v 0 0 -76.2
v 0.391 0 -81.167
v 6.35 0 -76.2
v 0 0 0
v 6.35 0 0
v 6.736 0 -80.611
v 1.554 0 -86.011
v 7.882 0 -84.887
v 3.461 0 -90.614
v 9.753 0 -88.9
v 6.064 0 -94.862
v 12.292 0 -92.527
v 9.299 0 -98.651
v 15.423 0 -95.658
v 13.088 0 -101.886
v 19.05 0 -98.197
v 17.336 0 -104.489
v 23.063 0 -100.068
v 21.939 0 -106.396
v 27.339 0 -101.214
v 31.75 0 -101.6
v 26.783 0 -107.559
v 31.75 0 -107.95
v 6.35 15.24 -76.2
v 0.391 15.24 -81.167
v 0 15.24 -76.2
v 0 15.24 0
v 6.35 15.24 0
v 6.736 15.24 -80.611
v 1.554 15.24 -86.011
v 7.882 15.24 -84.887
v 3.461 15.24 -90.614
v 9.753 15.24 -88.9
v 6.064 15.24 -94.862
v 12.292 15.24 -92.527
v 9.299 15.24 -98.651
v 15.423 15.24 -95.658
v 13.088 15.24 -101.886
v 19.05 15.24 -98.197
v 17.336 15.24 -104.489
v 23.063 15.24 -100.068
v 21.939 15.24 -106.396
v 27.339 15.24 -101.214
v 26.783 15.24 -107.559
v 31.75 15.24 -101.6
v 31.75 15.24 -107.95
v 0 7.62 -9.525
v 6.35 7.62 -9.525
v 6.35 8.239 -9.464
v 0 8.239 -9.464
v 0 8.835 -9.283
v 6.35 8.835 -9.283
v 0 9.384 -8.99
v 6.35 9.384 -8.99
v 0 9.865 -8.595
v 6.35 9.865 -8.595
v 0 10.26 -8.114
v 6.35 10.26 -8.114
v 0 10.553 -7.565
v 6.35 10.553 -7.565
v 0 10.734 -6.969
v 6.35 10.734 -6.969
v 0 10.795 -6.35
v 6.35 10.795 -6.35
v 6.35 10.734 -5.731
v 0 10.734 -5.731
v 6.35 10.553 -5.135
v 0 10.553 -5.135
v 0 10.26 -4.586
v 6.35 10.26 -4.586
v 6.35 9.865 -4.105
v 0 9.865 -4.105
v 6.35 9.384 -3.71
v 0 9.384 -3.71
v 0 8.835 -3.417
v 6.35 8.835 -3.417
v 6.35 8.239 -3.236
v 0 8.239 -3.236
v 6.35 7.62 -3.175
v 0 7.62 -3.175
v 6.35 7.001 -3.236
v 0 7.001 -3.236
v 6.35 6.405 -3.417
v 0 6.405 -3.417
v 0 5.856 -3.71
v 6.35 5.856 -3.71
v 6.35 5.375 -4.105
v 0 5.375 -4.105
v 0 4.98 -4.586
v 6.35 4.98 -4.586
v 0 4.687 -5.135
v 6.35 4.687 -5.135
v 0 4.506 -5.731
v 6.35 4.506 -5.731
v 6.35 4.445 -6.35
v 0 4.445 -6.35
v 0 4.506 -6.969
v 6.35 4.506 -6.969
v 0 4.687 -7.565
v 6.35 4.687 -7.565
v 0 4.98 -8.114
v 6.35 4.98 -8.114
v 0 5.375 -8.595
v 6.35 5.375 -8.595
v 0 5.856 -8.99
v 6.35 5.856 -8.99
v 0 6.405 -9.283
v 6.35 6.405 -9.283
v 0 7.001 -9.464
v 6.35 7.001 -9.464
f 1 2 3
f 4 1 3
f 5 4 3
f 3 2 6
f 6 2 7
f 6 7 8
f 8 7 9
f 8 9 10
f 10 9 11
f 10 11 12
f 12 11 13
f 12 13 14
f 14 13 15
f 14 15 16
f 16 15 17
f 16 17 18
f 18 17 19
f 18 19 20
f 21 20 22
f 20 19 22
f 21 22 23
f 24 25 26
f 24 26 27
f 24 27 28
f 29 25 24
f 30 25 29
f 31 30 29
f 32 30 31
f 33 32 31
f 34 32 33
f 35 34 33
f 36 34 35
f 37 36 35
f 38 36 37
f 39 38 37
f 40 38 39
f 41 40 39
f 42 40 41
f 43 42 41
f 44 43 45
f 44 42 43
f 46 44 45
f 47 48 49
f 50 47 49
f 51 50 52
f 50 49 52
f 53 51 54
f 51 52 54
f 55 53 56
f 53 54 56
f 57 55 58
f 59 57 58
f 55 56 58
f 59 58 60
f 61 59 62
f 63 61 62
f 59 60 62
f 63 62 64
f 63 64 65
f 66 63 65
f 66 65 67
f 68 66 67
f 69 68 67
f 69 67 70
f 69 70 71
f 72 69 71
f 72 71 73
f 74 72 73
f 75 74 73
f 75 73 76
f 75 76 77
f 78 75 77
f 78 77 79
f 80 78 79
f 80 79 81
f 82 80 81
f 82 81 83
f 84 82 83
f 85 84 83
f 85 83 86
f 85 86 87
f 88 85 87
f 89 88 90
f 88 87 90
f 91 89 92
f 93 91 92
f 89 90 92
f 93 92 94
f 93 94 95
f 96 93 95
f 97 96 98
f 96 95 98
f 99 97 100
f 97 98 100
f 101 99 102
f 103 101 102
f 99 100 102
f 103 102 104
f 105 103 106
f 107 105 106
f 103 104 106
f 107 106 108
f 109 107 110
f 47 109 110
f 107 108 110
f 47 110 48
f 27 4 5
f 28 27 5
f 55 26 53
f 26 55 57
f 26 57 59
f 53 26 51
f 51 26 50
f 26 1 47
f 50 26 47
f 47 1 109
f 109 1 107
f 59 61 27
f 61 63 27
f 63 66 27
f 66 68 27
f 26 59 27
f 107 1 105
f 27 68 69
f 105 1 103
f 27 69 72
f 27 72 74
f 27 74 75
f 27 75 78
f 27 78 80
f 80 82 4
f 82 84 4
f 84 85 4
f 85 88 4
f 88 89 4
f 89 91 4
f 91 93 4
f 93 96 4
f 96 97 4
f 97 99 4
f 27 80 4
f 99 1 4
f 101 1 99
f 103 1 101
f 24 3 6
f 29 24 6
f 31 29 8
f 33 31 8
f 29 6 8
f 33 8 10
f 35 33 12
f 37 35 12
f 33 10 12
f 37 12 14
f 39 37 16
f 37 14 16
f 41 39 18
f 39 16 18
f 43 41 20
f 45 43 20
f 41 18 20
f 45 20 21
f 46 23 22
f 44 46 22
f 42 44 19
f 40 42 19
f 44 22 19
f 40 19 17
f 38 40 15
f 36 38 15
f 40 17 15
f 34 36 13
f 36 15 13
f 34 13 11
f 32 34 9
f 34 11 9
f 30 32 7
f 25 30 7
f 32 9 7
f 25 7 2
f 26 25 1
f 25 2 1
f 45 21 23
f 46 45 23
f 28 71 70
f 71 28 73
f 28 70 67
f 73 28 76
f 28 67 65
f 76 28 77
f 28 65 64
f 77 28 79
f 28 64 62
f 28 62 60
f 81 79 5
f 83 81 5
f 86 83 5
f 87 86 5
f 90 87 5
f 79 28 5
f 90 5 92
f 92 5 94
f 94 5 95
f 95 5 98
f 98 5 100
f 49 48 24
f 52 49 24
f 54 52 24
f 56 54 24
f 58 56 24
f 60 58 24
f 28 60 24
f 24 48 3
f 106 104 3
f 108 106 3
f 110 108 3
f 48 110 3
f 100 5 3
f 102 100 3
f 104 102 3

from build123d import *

# Parameters (mm, degrees)
BOSS_EXTRUDE1_DEPTH = 15.24
SKETCH2_R           = 3.175
CUT_EXTRUDE1_DEPTH  = 15.24


with BuildPart() as part:
    # Sketch1 → Boss-Extrude1 (new body)
    with BuildSketch(Plane(origin=(0, 0, 0), x_dir=(1, 0, 0), z_dir=(0, 1, 0))):
        with BuildLine():
            Line((31.75, 101.6), (31.75, 107.95))
            ThreePointArc((31.75, 107.95), (9.299359697, 98.650640303), (0, 76.2))
            Line((0, 76.2), (0, 0))
            Line((0, 0), (6.35, 0))
            Line((6.35, 0), (6.35, 76.2))
            ThreePointArc((6.35, 76.2), (13.789487758, 94.160512242), (31.75, 101.6))
        make_face()
    extrude(amount=BOSS_EXTRUDE1_DEPTH)

    # Sketch2 → Cut-Extrude1 (cut)
    with BuildSketch(Plane(origin=(6.35, 0, 0), x_dir=(0, 0, -1), z_dir=(1, 0, 0))):
        with Locations((6.35, 7.62)):
            Circle(SKETCH2_R)
    extrude(amount=-CUT_EXTRUDE1_DEPTH, mode=Mode.SUBTRACT)


solid = part.part
